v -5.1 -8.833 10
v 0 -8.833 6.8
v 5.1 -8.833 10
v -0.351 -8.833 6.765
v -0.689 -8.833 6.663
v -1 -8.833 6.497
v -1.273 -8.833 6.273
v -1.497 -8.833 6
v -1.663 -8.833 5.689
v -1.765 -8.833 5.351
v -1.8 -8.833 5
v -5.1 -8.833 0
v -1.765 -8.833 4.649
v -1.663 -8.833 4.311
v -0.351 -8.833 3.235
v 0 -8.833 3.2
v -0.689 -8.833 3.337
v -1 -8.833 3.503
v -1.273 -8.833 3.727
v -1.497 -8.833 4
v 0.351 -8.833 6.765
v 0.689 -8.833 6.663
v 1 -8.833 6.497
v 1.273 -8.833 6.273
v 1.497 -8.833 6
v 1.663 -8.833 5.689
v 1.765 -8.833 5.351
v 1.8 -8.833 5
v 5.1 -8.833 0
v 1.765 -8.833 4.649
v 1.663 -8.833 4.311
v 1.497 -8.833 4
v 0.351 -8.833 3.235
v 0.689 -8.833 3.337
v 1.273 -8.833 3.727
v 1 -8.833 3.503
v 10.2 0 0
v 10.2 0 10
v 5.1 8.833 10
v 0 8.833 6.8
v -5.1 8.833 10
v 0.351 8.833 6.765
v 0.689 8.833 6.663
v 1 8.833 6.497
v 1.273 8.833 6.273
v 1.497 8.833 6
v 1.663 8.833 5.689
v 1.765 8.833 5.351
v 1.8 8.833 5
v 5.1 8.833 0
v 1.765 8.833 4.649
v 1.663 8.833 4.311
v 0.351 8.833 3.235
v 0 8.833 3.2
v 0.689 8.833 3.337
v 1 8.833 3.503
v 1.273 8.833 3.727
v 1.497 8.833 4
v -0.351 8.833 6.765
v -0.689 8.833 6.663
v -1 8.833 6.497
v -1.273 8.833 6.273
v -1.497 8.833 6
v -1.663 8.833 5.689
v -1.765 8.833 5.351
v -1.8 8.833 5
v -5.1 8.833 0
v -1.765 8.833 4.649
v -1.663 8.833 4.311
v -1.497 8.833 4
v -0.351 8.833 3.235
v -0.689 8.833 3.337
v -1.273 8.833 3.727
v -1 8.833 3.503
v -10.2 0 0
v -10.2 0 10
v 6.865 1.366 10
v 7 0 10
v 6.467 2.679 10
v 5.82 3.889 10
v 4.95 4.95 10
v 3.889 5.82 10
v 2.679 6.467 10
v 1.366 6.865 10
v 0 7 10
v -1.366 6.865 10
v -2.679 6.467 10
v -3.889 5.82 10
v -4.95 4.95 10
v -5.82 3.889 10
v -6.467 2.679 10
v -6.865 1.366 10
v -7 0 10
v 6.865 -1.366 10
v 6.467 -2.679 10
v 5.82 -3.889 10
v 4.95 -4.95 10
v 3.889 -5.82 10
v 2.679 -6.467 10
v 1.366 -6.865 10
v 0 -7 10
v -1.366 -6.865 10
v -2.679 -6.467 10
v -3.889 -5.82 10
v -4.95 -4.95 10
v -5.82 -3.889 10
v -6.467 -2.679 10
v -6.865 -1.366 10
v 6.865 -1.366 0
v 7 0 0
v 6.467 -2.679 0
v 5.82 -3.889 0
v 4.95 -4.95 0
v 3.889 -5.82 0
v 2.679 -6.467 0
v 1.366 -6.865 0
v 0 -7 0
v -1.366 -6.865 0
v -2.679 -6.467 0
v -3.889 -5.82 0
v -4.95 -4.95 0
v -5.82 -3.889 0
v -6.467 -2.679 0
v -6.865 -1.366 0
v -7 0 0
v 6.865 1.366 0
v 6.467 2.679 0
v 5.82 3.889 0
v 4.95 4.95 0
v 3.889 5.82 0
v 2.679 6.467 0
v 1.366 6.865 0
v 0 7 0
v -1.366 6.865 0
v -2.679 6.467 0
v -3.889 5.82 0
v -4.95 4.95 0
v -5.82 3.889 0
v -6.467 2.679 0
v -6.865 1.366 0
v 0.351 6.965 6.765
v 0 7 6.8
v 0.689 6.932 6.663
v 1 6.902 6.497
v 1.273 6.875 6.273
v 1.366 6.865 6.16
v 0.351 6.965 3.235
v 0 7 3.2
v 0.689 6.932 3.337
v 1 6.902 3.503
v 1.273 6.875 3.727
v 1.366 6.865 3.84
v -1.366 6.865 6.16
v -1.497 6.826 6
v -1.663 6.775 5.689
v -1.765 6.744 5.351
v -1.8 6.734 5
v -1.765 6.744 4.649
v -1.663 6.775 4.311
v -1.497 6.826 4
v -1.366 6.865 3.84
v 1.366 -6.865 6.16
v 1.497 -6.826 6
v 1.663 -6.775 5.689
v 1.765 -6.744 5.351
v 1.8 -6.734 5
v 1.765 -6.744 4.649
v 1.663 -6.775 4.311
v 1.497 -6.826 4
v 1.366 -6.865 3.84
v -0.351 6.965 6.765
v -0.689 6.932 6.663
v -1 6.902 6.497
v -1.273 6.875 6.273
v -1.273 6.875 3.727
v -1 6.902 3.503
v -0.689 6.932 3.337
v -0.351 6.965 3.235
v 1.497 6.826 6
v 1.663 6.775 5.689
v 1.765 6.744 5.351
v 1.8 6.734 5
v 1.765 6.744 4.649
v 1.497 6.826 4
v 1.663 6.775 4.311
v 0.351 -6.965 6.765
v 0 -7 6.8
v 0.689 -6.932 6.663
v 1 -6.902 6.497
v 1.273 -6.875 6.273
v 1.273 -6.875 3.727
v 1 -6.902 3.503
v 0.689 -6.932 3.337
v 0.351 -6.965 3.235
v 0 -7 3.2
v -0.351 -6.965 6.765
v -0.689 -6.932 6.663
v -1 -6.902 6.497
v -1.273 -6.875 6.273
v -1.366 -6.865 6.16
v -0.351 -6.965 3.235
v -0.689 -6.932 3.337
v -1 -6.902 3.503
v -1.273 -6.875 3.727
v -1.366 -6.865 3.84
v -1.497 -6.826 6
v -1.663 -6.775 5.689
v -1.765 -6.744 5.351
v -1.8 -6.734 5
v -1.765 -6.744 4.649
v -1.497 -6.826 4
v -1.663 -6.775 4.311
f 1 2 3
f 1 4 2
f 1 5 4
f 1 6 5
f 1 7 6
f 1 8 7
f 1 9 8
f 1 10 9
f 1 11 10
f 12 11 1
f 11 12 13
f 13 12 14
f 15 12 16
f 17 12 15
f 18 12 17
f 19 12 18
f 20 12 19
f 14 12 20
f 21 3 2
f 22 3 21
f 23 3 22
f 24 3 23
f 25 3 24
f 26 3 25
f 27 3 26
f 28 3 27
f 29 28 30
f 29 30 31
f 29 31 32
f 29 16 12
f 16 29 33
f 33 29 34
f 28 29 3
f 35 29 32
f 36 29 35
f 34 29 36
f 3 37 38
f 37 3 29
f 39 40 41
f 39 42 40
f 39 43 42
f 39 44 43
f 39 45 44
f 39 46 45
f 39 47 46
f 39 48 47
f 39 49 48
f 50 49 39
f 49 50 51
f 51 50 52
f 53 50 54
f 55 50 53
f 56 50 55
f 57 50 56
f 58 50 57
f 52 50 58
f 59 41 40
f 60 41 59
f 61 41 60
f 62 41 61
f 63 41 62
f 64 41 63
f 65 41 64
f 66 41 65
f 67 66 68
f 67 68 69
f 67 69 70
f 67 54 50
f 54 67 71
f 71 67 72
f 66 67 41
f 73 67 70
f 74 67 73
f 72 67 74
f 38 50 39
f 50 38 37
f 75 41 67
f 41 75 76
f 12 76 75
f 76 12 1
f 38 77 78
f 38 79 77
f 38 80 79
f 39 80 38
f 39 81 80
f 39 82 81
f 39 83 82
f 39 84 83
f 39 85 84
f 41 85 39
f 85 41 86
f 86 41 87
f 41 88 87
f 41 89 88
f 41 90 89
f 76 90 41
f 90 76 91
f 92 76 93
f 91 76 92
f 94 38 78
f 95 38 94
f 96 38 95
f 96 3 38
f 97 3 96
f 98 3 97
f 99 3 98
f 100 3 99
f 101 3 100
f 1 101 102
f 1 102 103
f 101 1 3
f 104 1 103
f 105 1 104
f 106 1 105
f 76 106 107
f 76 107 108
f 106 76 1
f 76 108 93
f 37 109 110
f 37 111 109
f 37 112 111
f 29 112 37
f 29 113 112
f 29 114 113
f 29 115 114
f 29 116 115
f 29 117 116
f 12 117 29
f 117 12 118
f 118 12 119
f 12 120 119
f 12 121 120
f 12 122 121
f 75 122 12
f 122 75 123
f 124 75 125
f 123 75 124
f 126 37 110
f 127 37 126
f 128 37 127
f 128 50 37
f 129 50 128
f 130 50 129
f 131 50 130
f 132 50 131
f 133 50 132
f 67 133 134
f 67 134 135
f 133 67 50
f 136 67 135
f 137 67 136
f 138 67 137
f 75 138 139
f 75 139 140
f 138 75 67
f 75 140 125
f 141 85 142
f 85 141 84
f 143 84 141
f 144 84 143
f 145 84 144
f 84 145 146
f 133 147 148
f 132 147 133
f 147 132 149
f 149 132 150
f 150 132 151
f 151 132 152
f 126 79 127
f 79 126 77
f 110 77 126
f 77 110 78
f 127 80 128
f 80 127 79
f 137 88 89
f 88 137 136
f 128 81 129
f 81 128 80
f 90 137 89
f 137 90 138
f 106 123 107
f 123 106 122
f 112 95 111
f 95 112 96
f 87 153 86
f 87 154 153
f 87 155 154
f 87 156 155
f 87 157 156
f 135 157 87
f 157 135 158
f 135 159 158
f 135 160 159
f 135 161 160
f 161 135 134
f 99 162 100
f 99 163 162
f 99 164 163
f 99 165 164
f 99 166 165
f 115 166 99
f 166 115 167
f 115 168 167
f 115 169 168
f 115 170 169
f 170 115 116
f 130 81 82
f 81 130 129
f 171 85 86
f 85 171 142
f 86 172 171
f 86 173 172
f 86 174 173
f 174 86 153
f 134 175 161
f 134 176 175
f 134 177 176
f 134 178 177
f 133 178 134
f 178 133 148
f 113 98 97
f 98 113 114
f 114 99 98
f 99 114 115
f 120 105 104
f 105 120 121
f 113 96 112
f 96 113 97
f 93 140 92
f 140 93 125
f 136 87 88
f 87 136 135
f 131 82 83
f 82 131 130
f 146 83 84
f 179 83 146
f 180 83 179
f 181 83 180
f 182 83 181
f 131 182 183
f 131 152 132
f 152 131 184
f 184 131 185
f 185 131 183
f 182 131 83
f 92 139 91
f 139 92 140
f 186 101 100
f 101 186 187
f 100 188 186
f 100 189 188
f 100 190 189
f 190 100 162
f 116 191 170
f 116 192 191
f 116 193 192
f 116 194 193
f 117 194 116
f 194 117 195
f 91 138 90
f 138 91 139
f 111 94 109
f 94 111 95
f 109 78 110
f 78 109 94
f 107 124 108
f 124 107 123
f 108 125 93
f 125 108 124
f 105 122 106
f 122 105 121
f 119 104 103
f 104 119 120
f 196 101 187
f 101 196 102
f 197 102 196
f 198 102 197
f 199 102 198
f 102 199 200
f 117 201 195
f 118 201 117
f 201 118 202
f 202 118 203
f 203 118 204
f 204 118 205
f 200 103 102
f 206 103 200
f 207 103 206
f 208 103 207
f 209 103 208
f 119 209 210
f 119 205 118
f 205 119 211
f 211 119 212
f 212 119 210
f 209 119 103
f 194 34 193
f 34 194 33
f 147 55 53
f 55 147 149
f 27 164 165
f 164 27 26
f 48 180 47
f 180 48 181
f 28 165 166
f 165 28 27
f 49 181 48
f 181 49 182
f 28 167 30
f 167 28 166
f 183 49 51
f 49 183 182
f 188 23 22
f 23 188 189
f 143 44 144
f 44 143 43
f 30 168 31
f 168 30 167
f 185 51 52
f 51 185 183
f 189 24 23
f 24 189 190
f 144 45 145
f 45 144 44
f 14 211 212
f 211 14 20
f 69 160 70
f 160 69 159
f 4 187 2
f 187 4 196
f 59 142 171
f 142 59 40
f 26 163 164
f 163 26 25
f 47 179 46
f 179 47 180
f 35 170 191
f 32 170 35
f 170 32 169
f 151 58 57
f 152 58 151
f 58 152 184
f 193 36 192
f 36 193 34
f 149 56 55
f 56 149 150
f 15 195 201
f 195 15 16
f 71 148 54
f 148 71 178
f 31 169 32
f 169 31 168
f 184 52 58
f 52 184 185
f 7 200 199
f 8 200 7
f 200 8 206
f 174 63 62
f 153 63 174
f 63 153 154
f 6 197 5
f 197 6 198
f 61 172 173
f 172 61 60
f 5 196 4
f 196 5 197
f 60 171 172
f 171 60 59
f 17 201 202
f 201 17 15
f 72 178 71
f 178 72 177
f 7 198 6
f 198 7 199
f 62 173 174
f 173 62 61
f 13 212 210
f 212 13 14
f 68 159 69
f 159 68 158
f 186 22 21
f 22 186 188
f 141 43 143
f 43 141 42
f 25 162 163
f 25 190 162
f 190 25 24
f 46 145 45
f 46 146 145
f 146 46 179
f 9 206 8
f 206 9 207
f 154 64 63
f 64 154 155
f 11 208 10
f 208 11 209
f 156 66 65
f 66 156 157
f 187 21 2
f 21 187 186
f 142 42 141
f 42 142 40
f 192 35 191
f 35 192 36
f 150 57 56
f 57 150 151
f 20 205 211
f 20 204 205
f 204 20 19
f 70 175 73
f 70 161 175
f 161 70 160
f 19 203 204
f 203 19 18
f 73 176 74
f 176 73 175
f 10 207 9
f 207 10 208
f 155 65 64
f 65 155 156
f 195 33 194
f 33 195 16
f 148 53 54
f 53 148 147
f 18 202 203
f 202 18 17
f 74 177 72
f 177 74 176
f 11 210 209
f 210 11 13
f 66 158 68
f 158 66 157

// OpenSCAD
// file: ../modules/hex-grid.scad
module hexGrid(hexInradius,height,supportThickness,xLen,yLen,skipCells,cappedCells,color) {

  center=true;

  xu = hexCircumradius(hexInradius-supportThickness/2)*1.5;
  yu = hexInradius*2-supportThickness;
  eu = hexInradius-supportThickness/2;
 
  xdist = center ? -xu*xLen/2+xu/2 : 0;
  ydist = center ? -yu*yLen/2 : 0;

  translate([xdist,ydist,0]) {
    for ( ix = [0 : xLen-1] ){ 
      even=ix%2;
      x = xu*ix; 
      for ( iy = [0 : yLen-even] ){ 
        y = yu*iy+eu*even;

        shouldSkip = search([[ix,iy]], skipCells)[0] >= 0;
        shouldCap = search([[ix,iy]], cappedCells)[0] >= 0;
        
        
        //color("black", shouldSkip ? 0.1 : 1) label(x,y,ix,iy,hexInradius);

        if(!shouldSkip) {
          color(color, shouldSkip ? 0.1 : 1) translate([x,y,0]) hex(hexInradius,supportThickness,height,shouldCap);
        }
      }
    }
  }
}

module hex(hexInradius,supportThickness,height,shouldCap) {
  zMove = shouldCap ? 1.6 : -1;
  difference() {
    cylinder(r=hexCircumradius(hexInradius),h=height,$fn=6);
    translate([0,0,zMove]) cylinder(r=hexCircumradius(hexInradius-supportThickness),h=height+2,$fn=6);
  }
}

module label(x,y,ix,iy,hexInradius) {
  translate([x,y,0]) rotate([$vpr[0],$vpr[2],$vpr[1]]) text(text = str("[",ix,",",iy,"]"), size = hexInradius/3, halign = "center", valign = "center");
}

function hexCircumradius(hexInradius) = hexInradius/sqrt(3)*2;
// main file
include <../modules/hex-grid.scad>;

$fn=32;

c=25.4;
caseD=[for (x=[17.83,18.35,9.06]) x*c];
poleL=21*c;
poleR=7;

hexInradius = 20;
supportThickness = 1.6;
supportWidth = poleR*2+supportThickness*2;

xCells = 7;
yCells = 5;
screwR = 1.8;

skipCells = [ 
  [2,4], [2,5],
  [3,2], [3,3], [3,4],
  [4,2], [4,3], [4,4], [4,5],
  [5,2], [5,3], [5,4],
  [6,2], [6,3], [6,4], [6,5]
];

cappedCells = [
];

difference() {
  union() {
    // cylinder(r=poleR+supportThickness,h=10+supportThickness);
    cylinder(r=poleR+supportThickness*2,h=10, $fn=6);
    // translate([0,0,10+supportThickness]) scale([1,1,0.25]) sphere(r=poleR+supportThickness);
  }
  translate([0,0,-1]) cylinder(r=poleR,h=11);
  translate([0,50,5]) rotate([90,0,0]) cylinder(r=screwR,h=100);

}

// difference() {
// cube([20,10,20]);
// translate([10,-19,10]) pole();
// }

// corner();
// poleCorner();

// poleSquare();

//prettyRender();

module prettyRender() {
  color("black") corner();
  mirror([1,0,0]) color("black") corner();
  mirror([0,1,0]) color("black") corner();
  mirror([0,1,0]) mirror([1,0,0]) color("black") corner();

translate([0,0,10]) color("grey") poleSquare();

  color("gray") translate([0,0,20]) case();

}

module corner() {
  supportPos = [-139,-131.6];
  translate([-149,-155,0]) 
  //translate([-130,-116,0]) 
  difference() {
    union() {
      translate([supportPos[0],supportPos[1],0]) {
        cube([supportWidth,228,supportWidth]);
        cube([250.5,supportWidth,supportWidth]);
      }


      hexGrid(hexInradius,supportWidth,supportThickness,xCells,yCells,skipCells,cappedCells);
    }
    translate([supportPos[0]+supportWidth/2,supportPos[1]+supportWidth/2,supportWidth/2]) {
      translate([0,20,-50]) cylinder(r=screwR,h=100);
      translate([20,0,-50]) cylinder(r=screwR,h=100);

      poleCorner();
    }
  }
   
}

module poleCorner() {
  translate([0,poleR+supportThickness,0]) pole();
  rotate([0,0,-90]) translate([0,poleR+supportThickness,0]) pole();
  translate([0,0,-20]) rotate([90,0,0]) pole(); 
}

module poleSquare() {
  poleO=7;
  translate([-(poleL+poleO*2+poleR)/2,-(poleL+poleO*2+poleR)/2,0]) {
    translate([0,poleO,0]) pole();
    rotate([90,0,0]) pole();
  }    
  rotate([0,0,90]) translate([-(poleL+poleO*2+poleR)/2,-(poleL+poleO*2+poleR)/2,0]) {
    translate([0,poleO,0]) pole();
    rotate([90,0,0]) pole();
  } 
  rotate([0,0,180]) translate([-(poleL+poleO*2+poleR)/2,-(poleL+poleO*2+poleR)/2,0]) {
    translate([0,poleO,0]) pole();
    rotate([90,0,0]) pole();
  } 
  rotate([0,0,270]) translate([-(poleL+poleO*2+poleR)/2,-(poleL+poleO*2+poleR)/2,0]) {
    translate([0,poleO,0]) pole();
    rotate([90,0,0]) pole();
  } 
}


module pole() {
  rotate([-90,0,0]) cylinder(r=poleR, h=poleL);
}
module case() {
  translate([-caseD[0]/2,-caseD[1]/2,0]) cube(caseD);
}
